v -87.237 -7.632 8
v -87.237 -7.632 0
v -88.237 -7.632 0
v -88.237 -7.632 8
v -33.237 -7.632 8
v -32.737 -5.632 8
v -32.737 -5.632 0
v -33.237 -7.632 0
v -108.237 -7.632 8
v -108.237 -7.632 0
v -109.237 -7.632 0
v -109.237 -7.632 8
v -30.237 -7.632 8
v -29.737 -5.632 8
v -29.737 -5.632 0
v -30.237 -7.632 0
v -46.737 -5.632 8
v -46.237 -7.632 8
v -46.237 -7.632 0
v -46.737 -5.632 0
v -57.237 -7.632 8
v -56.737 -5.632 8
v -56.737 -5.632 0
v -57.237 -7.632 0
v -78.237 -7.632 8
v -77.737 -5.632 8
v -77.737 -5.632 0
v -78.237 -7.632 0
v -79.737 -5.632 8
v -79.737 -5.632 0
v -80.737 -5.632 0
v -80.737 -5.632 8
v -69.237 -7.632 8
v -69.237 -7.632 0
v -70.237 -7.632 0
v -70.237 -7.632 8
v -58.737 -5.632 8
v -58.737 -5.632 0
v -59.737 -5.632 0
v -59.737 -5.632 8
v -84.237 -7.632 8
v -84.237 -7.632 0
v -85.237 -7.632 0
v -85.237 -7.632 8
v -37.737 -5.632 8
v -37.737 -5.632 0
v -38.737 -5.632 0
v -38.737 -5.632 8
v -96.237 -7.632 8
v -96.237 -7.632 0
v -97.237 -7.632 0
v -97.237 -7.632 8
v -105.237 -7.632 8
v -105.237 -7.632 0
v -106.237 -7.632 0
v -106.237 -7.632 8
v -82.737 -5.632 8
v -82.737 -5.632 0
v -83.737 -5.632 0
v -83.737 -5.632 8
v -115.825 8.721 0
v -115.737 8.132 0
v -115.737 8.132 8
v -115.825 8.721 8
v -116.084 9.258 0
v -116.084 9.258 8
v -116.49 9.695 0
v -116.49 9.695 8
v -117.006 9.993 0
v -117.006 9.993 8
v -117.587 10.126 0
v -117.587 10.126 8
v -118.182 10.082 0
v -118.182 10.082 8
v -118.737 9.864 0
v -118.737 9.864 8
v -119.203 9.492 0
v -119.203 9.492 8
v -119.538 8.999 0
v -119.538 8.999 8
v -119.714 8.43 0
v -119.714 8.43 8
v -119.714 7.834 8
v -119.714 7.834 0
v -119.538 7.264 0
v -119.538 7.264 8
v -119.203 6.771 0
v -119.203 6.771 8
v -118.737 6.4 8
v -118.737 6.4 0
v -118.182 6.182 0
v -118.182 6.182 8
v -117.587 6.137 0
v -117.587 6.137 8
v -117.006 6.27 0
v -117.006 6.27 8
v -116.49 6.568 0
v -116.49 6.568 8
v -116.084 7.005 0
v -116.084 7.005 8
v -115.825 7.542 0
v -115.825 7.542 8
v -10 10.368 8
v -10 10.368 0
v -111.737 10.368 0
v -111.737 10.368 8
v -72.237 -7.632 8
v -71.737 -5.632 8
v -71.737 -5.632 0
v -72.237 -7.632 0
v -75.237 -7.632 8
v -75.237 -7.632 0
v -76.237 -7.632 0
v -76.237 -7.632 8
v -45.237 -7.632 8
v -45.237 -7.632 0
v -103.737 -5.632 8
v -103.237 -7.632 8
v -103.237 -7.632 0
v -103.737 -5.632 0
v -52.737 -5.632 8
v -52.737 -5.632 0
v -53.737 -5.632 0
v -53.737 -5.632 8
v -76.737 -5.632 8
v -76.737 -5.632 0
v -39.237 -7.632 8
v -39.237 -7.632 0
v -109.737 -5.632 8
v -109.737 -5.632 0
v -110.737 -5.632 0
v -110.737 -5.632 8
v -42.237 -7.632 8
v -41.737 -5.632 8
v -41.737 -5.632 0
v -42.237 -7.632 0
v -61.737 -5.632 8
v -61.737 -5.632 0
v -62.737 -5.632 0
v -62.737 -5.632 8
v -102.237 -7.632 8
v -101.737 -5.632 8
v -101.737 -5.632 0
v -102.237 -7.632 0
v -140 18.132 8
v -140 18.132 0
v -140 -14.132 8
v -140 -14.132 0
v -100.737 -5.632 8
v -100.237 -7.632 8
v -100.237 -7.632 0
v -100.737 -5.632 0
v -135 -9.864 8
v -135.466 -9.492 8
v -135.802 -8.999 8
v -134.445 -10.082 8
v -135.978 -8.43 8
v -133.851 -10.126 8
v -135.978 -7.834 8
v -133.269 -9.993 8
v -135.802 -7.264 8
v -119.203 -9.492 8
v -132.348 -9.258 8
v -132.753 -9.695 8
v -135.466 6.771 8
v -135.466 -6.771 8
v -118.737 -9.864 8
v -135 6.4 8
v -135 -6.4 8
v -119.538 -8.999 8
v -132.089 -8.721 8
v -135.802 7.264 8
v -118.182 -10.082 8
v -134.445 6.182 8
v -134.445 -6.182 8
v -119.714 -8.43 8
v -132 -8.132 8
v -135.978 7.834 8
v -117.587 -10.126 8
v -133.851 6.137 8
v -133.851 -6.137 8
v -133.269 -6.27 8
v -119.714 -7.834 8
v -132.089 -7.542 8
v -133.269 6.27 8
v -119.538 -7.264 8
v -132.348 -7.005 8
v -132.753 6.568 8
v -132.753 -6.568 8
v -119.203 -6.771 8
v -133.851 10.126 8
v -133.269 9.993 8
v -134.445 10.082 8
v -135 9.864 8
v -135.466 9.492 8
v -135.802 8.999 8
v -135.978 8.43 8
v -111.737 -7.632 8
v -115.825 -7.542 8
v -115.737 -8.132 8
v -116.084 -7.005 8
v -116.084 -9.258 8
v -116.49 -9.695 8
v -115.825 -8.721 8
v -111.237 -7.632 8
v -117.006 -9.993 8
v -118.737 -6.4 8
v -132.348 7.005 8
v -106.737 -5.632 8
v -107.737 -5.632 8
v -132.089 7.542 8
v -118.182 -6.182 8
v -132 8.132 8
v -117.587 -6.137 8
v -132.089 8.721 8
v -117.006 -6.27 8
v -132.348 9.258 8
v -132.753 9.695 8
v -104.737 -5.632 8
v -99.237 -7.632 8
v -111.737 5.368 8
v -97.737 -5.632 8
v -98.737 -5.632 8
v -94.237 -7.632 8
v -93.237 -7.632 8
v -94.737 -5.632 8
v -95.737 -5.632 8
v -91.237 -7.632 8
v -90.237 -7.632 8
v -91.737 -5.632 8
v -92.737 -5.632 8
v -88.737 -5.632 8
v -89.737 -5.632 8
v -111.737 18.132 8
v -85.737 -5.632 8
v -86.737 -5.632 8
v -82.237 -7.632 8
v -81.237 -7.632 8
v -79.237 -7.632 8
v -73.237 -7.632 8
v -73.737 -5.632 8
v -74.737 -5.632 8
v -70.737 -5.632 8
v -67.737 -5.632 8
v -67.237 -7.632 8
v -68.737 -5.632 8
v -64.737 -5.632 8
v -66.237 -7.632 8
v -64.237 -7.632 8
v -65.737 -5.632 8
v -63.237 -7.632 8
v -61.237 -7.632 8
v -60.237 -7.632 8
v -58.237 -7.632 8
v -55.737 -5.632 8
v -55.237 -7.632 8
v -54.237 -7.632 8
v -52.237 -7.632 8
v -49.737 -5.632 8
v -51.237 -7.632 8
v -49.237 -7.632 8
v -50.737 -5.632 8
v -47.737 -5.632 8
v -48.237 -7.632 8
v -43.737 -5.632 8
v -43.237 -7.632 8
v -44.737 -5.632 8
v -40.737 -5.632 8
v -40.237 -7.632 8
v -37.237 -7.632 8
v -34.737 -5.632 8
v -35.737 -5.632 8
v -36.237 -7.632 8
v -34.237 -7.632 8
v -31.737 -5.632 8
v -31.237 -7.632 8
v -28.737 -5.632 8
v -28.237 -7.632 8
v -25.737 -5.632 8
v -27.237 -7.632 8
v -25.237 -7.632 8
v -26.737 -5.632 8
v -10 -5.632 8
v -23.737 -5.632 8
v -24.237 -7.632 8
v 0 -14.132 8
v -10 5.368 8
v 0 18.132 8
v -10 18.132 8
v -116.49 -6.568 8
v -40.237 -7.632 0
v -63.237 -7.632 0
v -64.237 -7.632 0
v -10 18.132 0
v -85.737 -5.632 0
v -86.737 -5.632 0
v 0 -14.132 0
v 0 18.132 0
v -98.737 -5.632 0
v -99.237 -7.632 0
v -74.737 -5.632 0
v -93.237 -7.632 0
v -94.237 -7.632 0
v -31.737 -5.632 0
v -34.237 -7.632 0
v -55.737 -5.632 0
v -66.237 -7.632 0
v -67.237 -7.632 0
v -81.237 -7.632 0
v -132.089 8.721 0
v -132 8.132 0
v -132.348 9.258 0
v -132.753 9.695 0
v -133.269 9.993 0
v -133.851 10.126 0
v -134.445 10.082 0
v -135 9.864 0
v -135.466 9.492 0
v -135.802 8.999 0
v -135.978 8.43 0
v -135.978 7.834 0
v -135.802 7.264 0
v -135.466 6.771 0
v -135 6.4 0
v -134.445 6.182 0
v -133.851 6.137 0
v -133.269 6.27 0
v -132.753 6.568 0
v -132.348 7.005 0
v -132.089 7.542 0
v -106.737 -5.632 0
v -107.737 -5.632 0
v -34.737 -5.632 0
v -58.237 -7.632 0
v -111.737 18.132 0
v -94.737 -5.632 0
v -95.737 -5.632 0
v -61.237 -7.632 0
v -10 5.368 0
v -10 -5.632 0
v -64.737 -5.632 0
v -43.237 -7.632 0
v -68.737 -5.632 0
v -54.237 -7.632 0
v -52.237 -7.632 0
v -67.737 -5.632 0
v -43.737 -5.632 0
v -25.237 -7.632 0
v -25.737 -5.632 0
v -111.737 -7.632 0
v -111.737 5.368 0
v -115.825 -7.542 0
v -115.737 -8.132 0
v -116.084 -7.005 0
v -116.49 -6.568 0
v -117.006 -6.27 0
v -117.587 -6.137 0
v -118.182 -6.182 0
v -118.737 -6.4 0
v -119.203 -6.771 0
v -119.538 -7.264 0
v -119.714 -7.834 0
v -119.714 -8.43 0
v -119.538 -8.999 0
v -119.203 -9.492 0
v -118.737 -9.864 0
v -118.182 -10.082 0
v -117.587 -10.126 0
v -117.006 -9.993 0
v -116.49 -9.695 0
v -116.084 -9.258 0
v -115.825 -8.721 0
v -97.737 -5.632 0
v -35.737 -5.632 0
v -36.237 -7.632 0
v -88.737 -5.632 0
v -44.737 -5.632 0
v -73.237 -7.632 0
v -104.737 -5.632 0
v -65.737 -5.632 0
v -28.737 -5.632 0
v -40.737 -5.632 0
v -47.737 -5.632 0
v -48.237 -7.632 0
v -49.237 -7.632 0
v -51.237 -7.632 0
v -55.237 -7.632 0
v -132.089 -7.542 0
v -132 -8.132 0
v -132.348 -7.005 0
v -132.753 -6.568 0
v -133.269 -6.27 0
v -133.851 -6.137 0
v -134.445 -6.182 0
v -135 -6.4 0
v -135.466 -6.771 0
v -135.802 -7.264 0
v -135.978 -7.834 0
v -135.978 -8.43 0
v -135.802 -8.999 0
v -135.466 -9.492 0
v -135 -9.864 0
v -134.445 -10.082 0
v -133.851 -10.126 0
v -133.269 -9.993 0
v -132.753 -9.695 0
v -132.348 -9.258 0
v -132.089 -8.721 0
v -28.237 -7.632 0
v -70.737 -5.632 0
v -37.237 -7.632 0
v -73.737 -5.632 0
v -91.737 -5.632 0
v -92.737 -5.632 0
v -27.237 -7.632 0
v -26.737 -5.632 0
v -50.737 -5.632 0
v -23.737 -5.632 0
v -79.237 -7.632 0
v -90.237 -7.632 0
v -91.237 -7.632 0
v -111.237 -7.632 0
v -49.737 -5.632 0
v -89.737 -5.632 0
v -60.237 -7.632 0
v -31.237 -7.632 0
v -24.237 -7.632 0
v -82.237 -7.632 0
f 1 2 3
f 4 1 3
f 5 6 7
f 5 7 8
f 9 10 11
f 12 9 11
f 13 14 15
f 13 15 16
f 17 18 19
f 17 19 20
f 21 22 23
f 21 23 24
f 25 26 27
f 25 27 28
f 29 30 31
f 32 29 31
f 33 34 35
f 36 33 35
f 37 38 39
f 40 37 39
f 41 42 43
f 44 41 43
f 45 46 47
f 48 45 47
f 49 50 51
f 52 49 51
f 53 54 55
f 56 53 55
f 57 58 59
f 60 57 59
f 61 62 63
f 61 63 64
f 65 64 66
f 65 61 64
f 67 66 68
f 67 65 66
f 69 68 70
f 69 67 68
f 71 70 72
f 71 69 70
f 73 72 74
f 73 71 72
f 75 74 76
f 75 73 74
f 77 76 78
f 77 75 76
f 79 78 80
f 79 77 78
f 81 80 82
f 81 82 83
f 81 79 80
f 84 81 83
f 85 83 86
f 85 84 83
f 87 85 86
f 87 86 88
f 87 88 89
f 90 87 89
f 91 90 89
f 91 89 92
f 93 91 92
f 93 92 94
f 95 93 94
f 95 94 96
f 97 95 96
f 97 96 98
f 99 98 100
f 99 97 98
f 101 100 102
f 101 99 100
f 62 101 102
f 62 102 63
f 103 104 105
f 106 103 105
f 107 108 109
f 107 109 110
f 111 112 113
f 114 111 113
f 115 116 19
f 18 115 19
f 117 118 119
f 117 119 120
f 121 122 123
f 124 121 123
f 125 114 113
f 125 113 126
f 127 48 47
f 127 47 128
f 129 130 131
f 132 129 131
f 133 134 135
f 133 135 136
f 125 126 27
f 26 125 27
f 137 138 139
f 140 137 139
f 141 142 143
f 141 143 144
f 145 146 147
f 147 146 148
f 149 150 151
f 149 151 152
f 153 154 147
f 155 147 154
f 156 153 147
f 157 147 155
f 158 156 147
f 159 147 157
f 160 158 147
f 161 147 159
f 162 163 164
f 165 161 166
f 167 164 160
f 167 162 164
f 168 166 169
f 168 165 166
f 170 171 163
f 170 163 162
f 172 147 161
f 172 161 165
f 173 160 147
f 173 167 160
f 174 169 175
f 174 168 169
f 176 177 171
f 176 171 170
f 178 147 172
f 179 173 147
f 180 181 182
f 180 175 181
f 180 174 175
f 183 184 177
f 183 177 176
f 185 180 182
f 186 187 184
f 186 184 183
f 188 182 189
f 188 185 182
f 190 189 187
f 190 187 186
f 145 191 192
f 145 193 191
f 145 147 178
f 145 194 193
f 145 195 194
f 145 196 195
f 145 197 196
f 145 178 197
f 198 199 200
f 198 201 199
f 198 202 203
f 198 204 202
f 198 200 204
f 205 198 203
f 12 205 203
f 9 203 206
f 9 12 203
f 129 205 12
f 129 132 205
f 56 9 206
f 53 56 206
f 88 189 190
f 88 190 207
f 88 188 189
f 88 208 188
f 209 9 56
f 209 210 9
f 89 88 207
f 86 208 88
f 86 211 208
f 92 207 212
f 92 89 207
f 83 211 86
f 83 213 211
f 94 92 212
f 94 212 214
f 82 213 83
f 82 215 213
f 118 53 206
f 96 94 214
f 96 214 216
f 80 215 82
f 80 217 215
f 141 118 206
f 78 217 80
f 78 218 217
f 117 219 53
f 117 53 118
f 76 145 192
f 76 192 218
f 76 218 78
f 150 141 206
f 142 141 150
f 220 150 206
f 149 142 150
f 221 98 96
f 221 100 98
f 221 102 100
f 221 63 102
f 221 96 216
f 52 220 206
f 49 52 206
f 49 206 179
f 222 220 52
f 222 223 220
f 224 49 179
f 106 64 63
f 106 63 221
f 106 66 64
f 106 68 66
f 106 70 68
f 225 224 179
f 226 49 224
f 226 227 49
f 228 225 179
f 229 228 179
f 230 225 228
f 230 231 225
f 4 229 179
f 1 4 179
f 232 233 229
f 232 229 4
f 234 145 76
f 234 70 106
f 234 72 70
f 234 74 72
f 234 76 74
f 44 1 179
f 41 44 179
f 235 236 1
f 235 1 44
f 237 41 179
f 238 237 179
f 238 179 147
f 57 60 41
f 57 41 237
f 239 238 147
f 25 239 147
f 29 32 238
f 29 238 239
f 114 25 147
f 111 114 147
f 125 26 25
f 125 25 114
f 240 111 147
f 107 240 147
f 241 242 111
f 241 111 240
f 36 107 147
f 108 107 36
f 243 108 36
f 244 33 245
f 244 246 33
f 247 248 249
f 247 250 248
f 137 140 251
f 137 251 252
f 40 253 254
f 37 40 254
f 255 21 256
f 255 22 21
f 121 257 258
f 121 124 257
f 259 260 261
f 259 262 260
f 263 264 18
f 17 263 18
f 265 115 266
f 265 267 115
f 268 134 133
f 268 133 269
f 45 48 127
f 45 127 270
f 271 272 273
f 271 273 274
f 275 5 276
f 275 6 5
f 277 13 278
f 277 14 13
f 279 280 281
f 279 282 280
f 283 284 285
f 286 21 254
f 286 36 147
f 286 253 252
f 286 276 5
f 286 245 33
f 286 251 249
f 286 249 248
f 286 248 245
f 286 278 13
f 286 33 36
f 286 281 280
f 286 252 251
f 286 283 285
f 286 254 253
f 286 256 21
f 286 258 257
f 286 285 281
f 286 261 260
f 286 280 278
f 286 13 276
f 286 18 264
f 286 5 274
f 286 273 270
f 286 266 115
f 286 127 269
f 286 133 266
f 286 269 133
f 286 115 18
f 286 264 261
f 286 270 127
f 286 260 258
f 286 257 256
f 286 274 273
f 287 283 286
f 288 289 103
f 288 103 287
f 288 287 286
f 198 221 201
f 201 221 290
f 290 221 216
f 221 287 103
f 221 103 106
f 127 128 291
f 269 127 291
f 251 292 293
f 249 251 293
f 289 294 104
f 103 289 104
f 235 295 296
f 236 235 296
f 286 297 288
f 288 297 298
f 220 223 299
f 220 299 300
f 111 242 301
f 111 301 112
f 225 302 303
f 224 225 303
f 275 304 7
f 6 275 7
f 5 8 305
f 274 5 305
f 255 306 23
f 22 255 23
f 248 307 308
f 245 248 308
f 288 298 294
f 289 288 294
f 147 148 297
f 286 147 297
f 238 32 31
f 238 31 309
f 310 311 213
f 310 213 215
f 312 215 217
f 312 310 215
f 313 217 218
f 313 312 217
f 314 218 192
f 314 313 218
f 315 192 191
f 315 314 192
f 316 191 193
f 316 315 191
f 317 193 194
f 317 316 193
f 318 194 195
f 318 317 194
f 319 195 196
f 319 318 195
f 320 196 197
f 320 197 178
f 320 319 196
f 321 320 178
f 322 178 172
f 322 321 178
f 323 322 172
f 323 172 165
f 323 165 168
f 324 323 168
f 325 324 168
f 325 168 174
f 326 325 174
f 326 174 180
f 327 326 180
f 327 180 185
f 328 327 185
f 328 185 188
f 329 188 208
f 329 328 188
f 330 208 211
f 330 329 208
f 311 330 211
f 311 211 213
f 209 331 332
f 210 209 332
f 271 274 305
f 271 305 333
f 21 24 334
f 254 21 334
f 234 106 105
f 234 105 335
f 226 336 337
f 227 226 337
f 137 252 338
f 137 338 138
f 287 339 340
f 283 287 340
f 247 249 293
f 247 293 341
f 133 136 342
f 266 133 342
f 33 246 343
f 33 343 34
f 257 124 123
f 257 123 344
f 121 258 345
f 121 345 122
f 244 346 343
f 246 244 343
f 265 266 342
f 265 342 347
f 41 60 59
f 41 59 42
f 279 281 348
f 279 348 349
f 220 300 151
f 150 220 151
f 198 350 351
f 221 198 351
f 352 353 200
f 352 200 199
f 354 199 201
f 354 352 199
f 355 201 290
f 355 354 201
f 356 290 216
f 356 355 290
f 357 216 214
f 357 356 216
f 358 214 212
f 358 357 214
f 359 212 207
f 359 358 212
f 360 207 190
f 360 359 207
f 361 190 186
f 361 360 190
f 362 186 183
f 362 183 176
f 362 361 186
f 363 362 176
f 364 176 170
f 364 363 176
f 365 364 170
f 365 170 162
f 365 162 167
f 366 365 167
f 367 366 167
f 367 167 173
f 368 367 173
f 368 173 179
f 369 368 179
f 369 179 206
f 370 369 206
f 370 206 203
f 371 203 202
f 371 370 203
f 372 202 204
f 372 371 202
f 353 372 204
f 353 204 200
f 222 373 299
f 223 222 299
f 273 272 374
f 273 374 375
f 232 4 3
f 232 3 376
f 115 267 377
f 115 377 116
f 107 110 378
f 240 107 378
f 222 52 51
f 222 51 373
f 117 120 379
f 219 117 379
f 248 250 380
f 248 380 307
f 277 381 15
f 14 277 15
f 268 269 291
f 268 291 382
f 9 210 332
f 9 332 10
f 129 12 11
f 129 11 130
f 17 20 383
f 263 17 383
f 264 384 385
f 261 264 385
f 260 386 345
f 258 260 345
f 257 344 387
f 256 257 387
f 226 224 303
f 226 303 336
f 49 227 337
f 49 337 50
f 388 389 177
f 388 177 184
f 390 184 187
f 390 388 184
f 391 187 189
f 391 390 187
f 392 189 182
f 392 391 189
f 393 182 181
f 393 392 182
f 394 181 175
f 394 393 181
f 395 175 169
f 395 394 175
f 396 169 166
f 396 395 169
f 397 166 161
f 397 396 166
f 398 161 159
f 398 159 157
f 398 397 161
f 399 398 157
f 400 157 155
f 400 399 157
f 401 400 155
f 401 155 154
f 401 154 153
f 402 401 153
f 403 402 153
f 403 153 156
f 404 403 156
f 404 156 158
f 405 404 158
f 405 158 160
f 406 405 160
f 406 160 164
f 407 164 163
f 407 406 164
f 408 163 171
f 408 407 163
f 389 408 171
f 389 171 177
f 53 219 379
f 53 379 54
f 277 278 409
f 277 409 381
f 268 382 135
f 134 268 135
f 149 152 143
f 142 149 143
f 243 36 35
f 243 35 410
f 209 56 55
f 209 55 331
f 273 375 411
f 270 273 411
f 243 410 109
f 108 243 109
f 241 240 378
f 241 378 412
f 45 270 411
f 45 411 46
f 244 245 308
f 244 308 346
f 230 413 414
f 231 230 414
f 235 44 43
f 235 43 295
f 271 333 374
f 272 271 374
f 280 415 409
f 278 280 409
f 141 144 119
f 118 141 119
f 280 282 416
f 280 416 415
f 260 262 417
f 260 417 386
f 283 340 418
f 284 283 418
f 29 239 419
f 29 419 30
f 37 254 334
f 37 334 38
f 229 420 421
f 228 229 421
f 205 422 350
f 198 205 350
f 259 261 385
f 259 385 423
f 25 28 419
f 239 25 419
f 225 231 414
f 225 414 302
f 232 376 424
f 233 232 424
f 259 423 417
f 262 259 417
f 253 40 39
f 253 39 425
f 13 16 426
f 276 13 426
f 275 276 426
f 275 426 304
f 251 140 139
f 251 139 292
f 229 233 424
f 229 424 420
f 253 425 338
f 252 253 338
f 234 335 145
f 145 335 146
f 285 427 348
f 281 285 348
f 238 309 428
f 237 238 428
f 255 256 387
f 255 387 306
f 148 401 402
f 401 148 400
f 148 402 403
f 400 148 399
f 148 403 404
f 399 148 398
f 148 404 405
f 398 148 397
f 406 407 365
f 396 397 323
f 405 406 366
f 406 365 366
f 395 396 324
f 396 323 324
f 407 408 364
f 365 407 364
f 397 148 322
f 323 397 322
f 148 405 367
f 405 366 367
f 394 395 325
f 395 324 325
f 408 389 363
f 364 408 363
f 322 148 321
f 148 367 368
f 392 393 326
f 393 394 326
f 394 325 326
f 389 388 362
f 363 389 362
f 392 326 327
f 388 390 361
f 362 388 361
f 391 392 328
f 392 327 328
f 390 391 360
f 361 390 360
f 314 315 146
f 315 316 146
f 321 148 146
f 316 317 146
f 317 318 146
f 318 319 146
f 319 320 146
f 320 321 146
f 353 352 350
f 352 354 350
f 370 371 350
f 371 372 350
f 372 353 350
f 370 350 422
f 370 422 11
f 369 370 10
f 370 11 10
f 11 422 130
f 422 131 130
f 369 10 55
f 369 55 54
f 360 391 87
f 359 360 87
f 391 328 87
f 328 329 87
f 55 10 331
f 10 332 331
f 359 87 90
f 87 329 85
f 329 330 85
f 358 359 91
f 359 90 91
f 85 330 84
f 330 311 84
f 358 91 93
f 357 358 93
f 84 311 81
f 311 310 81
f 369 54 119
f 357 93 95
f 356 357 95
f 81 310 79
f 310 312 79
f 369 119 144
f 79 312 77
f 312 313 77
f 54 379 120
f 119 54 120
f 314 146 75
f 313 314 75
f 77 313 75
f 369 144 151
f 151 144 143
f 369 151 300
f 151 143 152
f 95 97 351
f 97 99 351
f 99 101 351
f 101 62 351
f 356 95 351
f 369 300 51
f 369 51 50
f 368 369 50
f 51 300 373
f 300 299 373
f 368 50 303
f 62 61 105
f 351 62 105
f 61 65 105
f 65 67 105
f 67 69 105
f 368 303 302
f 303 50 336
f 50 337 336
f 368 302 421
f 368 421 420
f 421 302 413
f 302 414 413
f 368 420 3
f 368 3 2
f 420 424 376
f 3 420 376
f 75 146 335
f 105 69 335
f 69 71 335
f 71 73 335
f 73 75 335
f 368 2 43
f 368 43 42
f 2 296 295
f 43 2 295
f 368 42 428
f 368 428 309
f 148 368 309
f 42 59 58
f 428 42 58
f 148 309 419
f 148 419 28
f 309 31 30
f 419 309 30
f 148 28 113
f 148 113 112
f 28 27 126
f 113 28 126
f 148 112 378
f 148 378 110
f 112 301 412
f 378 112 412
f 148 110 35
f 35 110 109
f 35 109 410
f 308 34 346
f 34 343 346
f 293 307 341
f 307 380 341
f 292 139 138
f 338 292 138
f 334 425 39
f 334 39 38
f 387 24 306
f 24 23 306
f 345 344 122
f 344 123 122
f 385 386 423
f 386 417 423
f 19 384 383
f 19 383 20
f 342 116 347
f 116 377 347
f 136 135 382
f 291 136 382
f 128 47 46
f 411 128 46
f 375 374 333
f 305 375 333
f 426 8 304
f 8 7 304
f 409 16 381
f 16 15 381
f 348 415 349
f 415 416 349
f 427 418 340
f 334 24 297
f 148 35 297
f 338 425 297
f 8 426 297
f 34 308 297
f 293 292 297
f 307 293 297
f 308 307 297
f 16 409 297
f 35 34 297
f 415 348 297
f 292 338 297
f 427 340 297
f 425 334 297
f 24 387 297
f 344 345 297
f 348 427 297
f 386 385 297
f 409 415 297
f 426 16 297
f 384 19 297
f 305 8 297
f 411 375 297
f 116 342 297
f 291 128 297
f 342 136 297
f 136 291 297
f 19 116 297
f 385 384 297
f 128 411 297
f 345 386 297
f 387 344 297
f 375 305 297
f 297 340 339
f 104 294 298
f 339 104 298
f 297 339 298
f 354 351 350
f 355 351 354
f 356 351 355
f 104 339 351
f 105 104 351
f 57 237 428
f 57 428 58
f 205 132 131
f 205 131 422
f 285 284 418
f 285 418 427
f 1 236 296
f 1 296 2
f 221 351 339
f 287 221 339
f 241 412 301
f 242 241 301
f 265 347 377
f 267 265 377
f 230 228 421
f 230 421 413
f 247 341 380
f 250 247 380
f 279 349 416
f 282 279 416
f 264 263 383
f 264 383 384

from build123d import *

# Parameters (mm, degrees)
SKETCH1_R           = 2
BOSS_EXTRUDE1_DEPTH = 8


with BuildPart() as part:
    # Sketch1 → Boss-Extrude1 (new body)
    with BuildSketch(Plane.XY):
        Polygon((-111.736544033, -14.131727984), (-9.968599743, -14.131727984), (0, -14.131727984), (0, 18.131727984), (-10, 18.131727984), (-10, 10.368272016), (-111.736544033, 10.368272016), (-111.736544033, 18.131727984), (-140, 18.131727984), (-140, -14.131727984), align=None)
        with Locations((-134, 8.131727984)):
            Circle(SKETCH1_R, mode=Mode.SUBTRACT)
        with Locations((-117.736544033, 8.131727984)):
            Circle(SKETCH1_R, mode=Mode.SUBTRACT)
        with Locations((-134, -8.131727984)):
            Circle(SKETCH1_R, mode=Mode.SUBTRACT)
        with Locations((-117.736544033, -8.131727984)):
            Circle(SKETCH1_R, mode=Mode.SUBTRACT)
        Polygon((-111.736544033, -7.631727984), (-111.736544033, 5.368272016), (-10, 5.368272016), (-10, -5.631727984), (-23.736544033, -5.631727984), (-24.236544033, -7.631727984), (-24.736544033, -7.631727984), (-25.236544033, -7.631727984), (-25.736544033, -5.631727984), (-26.736544033, -5.631727984), (-27.236544033, -7.631727984), (-27.736544033, -7.631727984), (-28.236544033, -7.631727984), (-28.736544033, -5.631727984), (-29.736544033, -5.631727984), (-30.236544033, -7.631727984), (-30.736544033, -7.631727984), (-31.236544033, -7.631727984), (-31.736544033, -5.631727984), (-32.736544033, -5.631727984), (-33.236544033, -7.631727984), (-33.736544033, -7.631727984), (-34.236544033, -7.631727984), (-34.736544033, -5.631727984), (-35.736544033, -5.631727984), (-36.236544033, -7.631727984), (-36.736544033, -7.631727984), (-37.236544033, -7.631727984), (-37.736544033, -5.631727984), (-38.736544033, -5.631727984), (-39.236544033, -7.631727984), (-39.736544033, -7.631727984), (-40.236544033, -7.631727984), (-40.736544033, -5.631727984), (-41.736544033, -5.631727984), (-42.236544033, -7.631727984), (-42.736544033, -7.631727984), (-43.236544033, -7.631727984), (-43.736544033, -5.631727984), (-44.736544033, -5.631727984), (-45.236544033, -7.631727984), (-45.736544033, -7.631727984), (-46.236544033, -7.631727984), (-46.736544033, -5.631727984), (-47.736544033, -5.631727984), (-48.236544033, -7.631727984), (-48.736544033, -7.631727984), (-49.236544033, -7.631727984), (-49.736544033, -5.631727984), (-50.736544033, -5.631727984), (-51.236544033, -7.631727984), (-51.736544033, -7.631727984), (-52.236544033, -7.631727984), (-52.736544033, -5.631727984), (-53.736544033, -5.631727984), (-54.236544033, -7.631727984), (-54.736544033, -7.631727984), (-55.236544033, -7.631727984), (-55.736544033, -5.631727984), (-56.736544033, -5.631727984), (-57.236544033, -7.631727984), (-57.736544033, -7.631727984), (-58.236544033, -7.631727984), (-58.736544033, -5.631727984), (-59.736544033, -5.631727984), (-60.236544033, -7.631727984), (-60.736544033, -7.631727984), (-61.236544033, -7.631727984), (-61.736544033, -5.631727984), (-62.736544033, -5.631727984), (-63.236544033, -7.631727984), (-63.736544033, -7.631727984), (-64.236544033, -7.631727984), (-64.736544033, -5.631727984), (-65.736544033, -5.631727984), (-66.236544033, -7.631727984), (-66.736544033, -7.631727984), (-67.236544033, -7.631727984), (-67.736544033, -5.631727984), (-68.736544033, -5.631727984), (-69.236544033, -7.631727984), (-69.736544033, -7.631727984), (-70.236544033, -7.631727984), (-70.736544033, -5.631727984), (-71.736544033, -5.631727984), (-72.236544033, -7.631727984), (-72.736544033, -7.631727984), (-73.236544033, -7.631727984), (-73.736544033, -5.631727984), (-74.736544033, -5.631727984), (-75.236544033, -7.631727984), (-75.736544033, -7.631727984), (-76.236544033, -7.631727984), (-76.736544033, -5.631727984), (-77.736544033, -5.631727984), (-78.236544033, -7.631727984), (-78.736544033, -7.631727984), (-79.236544033, -7.631727984), (-79.736544033, -5.631727984), (-80.736544033, -5.631727984), (-81.236544033, -7.631727984), (-81.736544033, -7.631727984), (-82.236544033, -7.631727984), (-82.736544033, -5.631727984), (-83.736544033, -5.631727984), (-84.236544033, -7.631727984), (-84.736544033, -7.631727984), (-85.236544033, -7.631727984), (-85.736544033, -5.631727984), (-86.736544033, -5.631727984), (-87.236544033, -7.631727984), (-87.736544033, -7.631727984), (-88.236544033, -7.631727984), (-88.736544033, -5.631727984), (-89.736544033, -5.631727984), (-90.236544033, -7.631727984), (-90.736544033, -7.631727984), (-91.236544033, -7.631727984), (-91.736544033, -5.631727984), (-92.736544033, -5.631727984), (-93.236544033, -7.631727984), (-93.736544033, -7.631727984), (-94.236544033, -7.631727984), (-94.736544033, -5.631727984), (-95.736544033, -5.631727984), (-96.236544033, -7.631727984), (-96.736544033, -7.631727984), (-97.236544033, -7.631727984), (-97.736544033, -5.631727984), (-98.736544033, -5.631727984), (-99.236544033, -7.631727984), (-99.736544033, -7.631727984), (-100.236544033, -7.631727984), (-100.736544033, -5.631727984), (-101.736544033, -5.631727984), (-102.236544033, -7.631727984), (-102.736544033, -7.631727984), (-103.236544033, -7.631727984), (-103.736544033, -5.631727984), (-104.736544033, -5.631727984), (-105.236544033, -7.631727984), (-105.736544033, -7.631727984), (-106.236544033, -7.631727984), (-106.736544033, -5.631727984), (-107.736544033, -5.631727984), (-108.236544033, -7.631727984), (-108.736544033, -7.631727984), (-109.236544033, -7.631727984), (-109.736544033, -5.631727984), (-110.736544033, -5.631727984), (-111.236544033, -7.631727984), align=None, mode=Mode.SUBTRACT)
    extrude(amount=BOSS_EXTRUDE1_DEPTH)


solid = part.part
